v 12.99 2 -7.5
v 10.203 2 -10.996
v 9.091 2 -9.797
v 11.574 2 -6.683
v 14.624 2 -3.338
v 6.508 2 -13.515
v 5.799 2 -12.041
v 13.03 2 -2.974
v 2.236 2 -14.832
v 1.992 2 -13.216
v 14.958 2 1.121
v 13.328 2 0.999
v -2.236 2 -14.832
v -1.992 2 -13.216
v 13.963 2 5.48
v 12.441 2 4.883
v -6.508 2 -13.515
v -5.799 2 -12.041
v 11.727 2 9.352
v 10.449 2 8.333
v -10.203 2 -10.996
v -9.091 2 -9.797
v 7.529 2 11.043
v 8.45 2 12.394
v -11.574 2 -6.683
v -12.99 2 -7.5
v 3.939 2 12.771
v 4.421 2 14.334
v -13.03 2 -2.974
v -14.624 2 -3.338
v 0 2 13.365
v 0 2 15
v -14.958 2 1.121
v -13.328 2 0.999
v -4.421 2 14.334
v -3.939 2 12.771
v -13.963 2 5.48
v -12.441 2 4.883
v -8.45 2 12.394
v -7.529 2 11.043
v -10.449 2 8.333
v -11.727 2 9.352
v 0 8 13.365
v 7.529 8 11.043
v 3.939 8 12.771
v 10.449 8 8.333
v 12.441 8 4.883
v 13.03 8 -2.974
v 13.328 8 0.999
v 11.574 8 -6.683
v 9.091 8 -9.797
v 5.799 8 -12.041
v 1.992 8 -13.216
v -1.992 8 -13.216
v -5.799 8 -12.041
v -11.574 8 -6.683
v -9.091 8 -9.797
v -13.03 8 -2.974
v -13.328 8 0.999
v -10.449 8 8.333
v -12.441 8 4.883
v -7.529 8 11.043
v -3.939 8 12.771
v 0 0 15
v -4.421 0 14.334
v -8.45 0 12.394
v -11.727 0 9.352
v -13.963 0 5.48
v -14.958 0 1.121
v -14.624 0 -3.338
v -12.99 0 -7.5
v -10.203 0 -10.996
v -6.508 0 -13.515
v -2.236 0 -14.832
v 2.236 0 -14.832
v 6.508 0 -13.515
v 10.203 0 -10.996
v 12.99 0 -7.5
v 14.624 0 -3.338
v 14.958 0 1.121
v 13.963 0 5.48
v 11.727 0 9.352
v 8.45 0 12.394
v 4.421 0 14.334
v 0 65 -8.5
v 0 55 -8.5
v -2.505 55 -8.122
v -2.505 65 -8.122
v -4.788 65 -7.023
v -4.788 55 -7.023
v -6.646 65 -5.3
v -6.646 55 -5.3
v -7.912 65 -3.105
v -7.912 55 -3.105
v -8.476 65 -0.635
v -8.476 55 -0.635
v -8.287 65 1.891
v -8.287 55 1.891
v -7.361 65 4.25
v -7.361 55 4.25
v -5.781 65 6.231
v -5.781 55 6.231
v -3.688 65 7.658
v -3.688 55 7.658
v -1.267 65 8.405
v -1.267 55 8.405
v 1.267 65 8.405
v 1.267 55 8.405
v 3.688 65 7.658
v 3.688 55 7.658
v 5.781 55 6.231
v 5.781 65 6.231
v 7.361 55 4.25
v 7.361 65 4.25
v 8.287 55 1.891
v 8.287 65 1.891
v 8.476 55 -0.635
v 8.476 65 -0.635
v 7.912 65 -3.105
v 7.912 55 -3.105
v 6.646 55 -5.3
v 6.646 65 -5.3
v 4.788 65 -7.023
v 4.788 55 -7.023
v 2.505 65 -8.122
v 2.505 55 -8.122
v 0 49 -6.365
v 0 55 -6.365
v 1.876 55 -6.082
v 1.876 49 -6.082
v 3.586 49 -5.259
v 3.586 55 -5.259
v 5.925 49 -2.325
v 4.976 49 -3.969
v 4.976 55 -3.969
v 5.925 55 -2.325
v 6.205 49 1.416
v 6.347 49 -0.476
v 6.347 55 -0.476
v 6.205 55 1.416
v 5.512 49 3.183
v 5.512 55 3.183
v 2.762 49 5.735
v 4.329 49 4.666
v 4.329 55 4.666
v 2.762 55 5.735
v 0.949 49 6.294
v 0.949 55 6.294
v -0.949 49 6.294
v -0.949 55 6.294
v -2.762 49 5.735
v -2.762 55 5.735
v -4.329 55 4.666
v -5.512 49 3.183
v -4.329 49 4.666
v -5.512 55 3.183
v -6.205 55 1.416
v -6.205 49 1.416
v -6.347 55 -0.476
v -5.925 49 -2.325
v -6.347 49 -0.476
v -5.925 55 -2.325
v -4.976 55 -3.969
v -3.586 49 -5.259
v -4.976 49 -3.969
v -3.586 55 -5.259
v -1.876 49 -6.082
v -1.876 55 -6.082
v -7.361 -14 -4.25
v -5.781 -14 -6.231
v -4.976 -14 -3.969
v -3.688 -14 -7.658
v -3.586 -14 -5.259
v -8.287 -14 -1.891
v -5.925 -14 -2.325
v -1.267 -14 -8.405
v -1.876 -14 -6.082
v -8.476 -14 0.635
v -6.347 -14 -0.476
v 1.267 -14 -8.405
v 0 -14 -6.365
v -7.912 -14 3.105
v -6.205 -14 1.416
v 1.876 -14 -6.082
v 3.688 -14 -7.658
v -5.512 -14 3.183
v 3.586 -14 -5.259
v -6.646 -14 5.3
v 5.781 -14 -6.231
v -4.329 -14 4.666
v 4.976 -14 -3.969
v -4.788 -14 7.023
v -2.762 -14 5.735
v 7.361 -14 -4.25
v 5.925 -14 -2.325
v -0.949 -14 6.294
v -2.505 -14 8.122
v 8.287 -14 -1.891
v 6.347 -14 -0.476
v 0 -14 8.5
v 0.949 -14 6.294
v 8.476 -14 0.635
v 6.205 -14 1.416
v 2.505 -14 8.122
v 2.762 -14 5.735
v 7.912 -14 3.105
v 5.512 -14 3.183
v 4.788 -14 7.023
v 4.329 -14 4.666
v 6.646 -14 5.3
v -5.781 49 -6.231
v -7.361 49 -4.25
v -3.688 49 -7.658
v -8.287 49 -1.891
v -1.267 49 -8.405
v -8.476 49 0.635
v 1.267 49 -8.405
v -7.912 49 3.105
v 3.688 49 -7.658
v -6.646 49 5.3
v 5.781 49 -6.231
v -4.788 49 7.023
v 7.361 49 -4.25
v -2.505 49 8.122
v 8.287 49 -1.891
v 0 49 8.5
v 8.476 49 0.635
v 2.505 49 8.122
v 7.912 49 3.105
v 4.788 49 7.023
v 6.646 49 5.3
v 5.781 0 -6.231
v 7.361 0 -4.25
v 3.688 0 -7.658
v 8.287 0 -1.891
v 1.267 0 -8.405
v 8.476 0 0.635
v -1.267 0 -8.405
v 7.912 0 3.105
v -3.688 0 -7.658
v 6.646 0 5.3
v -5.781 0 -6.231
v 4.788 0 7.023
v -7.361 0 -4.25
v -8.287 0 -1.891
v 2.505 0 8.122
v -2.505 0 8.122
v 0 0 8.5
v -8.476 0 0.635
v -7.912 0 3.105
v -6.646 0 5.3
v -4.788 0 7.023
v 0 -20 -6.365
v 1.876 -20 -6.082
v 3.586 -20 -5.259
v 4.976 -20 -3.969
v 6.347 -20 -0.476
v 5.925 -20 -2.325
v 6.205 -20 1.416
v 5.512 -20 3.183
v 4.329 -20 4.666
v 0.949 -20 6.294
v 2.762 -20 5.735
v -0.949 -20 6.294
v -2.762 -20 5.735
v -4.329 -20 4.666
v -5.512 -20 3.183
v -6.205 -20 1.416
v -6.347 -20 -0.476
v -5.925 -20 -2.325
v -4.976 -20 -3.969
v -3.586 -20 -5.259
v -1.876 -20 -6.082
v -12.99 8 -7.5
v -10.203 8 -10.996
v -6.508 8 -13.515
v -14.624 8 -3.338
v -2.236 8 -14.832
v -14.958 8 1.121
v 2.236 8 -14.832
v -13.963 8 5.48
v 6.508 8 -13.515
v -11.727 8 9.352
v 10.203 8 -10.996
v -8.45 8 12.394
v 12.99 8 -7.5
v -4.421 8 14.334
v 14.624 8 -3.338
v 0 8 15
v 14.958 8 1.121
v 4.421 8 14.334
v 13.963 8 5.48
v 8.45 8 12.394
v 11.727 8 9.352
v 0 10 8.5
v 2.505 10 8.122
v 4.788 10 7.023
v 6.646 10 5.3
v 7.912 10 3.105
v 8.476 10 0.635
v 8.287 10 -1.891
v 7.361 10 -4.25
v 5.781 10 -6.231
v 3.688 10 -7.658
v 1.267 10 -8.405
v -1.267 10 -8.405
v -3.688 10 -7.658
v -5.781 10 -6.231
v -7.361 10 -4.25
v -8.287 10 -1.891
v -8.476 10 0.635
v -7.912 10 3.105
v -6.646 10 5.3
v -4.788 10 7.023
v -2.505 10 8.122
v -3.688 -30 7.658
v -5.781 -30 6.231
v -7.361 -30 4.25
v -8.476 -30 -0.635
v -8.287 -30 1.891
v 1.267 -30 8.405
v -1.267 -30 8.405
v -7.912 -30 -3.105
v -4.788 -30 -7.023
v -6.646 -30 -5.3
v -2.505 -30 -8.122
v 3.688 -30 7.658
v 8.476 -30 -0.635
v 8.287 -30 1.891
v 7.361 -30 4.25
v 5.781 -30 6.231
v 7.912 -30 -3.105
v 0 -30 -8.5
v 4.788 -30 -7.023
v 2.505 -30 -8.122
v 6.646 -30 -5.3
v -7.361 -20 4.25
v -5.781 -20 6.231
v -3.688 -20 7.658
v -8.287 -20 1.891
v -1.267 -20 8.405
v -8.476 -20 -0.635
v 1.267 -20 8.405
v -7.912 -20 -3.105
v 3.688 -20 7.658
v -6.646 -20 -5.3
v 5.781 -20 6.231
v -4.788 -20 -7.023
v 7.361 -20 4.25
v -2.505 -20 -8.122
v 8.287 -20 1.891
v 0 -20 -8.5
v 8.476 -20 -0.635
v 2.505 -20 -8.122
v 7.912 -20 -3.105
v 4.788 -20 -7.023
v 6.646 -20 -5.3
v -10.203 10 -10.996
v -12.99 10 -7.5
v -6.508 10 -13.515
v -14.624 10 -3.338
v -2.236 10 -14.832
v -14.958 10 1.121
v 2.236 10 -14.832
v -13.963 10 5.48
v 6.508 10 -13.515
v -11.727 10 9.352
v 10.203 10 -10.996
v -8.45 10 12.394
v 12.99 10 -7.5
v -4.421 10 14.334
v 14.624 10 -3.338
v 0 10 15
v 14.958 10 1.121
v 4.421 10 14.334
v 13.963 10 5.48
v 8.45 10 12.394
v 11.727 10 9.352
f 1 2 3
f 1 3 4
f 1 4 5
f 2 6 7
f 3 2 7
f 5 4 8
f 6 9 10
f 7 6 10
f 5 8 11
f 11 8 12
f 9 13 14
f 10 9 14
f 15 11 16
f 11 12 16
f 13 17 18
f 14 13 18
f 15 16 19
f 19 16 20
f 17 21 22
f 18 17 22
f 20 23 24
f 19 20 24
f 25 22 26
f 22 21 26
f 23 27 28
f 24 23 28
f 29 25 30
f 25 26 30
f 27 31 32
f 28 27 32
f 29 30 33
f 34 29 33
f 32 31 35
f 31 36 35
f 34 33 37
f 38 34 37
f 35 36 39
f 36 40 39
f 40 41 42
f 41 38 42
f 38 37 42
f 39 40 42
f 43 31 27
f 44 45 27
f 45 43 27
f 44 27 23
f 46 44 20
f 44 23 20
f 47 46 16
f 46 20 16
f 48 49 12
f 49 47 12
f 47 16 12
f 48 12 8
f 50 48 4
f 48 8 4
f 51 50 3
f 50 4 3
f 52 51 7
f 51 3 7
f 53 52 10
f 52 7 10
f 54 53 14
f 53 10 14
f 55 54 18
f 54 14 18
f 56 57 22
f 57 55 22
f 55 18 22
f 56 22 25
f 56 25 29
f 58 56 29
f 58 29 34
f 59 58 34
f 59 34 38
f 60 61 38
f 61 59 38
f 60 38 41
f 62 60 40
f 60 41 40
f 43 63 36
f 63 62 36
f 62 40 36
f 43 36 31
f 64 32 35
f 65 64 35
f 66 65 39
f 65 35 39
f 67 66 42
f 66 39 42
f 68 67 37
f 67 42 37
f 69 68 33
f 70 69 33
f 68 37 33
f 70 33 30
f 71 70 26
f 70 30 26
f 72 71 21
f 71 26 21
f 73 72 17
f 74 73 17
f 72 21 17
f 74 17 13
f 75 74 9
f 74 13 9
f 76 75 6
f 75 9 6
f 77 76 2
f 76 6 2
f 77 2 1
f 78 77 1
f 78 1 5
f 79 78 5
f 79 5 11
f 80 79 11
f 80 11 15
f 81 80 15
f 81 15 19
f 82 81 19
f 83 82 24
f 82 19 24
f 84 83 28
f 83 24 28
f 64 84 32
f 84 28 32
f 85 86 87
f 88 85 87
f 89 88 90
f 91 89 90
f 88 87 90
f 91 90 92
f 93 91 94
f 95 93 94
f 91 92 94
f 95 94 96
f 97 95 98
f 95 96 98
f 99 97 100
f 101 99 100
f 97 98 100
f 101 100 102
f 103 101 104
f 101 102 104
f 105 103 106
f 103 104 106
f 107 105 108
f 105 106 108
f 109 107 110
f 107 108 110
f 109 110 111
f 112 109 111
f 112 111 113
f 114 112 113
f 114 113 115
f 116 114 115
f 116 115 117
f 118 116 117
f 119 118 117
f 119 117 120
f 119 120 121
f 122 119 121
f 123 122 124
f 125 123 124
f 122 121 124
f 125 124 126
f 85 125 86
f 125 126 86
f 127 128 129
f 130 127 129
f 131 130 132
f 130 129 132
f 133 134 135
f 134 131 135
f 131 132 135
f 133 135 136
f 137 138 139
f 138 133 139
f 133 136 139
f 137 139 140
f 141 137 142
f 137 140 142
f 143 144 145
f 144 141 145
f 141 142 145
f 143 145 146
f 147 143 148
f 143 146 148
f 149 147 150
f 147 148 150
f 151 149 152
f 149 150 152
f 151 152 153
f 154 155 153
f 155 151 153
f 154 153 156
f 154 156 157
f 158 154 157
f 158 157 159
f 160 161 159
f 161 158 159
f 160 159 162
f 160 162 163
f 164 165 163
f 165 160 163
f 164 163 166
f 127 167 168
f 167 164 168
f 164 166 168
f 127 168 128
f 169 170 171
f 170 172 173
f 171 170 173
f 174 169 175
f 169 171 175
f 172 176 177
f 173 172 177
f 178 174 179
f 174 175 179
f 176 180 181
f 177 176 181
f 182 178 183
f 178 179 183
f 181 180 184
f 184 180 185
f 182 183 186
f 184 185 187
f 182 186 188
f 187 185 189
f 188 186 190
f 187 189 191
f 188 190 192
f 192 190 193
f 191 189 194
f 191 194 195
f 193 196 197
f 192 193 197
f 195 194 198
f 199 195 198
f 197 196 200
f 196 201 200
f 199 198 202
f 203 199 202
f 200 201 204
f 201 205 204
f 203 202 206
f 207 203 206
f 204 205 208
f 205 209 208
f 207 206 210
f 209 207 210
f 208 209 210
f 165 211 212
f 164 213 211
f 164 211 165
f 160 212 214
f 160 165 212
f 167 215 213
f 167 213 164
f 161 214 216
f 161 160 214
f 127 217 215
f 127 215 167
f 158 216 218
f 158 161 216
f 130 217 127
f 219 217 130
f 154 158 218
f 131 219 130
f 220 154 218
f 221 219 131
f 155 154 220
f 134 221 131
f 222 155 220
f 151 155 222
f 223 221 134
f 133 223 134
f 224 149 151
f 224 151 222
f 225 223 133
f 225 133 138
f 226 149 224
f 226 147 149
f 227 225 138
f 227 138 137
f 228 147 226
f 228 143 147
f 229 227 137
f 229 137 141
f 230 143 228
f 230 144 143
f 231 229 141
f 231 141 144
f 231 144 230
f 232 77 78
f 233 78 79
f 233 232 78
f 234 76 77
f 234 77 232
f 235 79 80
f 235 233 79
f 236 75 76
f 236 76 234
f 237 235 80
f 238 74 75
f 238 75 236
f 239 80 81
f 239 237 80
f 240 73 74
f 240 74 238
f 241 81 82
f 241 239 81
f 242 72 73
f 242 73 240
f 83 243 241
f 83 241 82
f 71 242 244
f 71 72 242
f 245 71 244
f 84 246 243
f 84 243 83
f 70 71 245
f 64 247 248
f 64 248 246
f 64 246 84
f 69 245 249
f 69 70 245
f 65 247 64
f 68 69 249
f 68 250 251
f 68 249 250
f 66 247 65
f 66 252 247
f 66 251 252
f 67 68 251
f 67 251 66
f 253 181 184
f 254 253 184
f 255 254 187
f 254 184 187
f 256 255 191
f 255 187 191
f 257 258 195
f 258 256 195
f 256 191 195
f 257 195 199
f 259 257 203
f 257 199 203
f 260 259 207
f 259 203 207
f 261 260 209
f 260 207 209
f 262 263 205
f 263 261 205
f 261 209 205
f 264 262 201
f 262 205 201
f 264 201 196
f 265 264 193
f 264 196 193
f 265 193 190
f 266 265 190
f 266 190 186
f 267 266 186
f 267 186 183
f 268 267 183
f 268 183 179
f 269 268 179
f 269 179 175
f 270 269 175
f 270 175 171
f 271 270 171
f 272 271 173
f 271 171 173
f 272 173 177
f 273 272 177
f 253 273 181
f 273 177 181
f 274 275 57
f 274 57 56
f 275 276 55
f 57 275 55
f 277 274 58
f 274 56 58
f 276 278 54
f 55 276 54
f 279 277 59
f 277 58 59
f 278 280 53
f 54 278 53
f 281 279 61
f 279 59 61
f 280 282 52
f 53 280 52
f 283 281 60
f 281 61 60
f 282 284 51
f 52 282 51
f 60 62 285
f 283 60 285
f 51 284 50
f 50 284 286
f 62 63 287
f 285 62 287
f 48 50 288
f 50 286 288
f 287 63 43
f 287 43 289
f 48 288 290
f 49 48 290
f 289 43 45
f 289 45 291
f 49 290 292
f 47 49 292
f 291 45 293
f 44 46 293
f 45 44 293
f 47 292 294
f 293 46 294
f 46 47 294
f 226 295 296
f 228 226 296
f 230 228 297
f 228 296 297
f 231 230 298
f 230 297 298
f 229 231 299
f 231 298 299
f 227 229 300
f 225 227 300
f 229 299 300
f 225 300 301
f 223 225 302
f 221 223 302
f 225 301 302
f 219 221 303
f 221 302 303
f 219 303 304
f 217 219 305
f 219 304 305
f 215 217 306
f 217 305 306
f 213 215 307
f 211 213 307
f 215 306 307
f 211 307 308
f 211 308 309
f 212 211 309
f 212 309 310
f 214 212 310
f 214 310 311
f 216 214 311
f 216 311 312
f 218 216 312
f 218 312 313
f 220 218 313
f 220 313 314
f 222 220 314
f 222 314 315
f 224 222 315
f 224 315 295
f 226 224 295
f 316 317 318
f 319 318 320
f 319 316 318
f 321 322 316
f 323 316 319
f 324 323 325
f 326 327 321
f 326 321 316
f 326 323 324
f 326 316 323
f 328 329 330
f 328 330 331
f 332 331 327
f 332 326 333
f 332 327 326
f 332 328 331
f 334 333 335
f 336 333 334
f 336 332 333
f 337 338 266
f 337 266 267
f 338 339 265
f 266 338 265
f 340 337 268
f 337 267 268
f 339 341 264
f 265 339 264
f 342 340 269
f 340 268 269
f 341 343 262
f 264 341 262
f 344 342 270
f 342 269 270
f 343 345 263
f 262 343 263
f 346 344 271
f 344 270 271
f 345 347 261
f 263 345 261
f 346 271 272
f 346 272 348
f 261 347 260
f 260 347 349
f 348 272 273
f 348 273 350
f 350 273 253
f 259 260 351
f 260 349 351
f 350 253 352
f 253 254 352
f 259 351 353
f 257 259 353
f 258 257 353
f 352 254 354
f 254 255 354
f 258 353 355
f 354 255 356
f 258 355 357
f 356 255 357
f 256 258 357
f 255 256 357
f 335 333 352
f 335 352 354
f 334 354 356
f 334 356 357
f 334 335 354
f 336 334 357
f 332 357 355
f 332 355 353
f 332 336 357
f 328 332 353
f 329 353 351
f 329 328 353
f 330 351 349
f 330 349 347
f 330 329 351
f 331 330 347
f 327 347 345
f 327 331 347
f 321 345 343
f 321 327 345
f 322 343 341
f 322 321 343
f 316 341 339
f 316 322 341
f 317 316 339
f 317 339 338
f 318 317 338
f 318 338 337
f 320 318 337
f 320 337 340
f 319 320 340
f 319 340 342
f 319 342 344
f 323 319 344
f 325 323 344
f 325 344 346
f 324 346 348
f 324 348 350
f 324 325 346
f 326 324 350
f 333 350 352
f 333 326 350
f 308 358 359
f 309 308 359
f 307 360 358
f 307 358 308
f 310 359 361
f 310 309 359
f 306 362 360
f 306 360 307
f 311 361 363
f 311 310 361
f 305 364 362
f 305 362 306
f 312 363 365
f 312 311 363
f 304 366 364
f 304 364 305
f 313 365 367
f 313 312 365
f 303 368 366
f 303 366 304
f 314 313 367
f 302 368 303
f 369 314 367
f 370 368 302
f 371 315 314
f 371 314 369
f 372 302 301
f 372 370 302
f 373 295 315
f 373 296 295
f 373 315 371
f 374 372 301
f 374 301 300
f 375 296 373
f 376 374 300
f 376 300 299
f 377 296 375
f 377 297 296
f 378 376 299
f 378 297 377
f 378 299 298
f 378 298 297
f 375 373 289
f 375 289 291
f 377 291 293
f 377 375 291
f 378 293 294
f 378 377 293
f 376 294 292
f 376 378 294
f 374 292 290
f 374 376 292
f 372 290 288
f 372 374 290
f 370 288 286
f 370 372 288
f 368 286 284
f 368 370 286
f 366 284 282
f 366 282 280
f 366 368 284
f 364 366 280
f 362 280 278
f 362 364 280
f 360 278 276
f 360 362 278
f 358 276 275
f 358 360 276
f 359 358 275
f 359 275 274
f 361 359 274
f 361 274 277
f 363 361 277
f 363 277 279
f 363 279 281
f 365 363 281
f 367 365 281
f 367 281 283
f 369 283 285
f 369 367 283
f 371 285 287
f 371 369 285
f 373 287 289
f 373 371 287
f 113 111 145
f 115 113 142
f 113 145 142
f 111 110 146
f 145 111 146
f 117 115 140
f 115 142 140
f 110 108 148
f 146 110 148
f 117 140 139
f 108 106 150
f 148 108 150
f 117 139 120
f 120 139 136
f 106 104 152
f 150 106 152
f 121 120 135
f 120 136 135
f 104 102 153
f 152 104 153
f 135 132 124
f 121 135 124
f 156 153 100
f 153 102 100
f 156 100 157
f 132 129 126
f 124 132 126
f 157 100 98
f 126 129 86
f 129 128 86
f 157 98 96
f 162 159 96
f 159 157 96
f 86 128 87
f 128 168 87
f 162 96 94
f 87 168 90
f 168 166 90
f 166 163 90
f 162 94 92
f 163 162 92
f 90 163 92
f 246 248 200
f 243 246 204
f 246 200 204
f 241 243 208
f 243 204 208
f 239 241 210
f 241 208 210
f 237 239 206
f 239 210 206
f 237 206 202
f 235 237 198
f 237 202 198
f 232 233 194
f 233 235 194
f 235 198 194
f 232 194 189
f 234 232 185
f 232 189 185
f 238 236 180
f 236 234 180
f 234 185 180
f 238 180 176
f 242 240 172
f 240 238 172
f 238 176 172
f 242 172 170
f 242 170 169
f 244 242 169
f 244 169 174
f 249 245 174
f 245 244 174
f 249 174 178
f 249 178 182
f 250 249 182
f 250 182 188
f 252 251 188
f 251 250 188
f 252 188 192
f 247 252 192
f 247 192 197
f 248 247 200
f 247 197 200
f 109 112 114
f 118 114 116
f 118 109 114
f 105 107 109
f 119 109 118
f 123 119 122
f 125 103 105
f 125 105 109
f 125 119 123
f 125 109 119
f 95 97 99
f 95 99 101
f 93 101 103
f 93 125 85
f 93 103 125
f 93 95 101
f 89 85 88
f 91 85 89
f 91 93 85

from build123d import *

# Parameters (mm, degrees)
SKETCH1_R                = 13.365
BOSS_EXTRUDE1_DEPTH      = 10
SKETCH2_R                = 15
BOSS_EXTRUDE2_DEPTH      = 2
BOSS_EXTRUDE3_START      = -2
SKETCH3_R                = 15
BOSS_EXTRUDE3_DEPTH      = 2
BOSS_EXTRUDE4_DEPTH      = 30
BOSS_EXTRUDE4_DEPTH_BACK = 65
SKETCH4_R                = 6.365
SKETCH5_R                = 8.5
BOSS_EXTRUDE5_DEPTH      = 10
BOSS_EXTRUDE6_START      = -10
SKETCH6_R                = 8.5
BOSS_EXTRUDE6_DEPTH      = 10
SKETCH7_R                = 8.5
BOSS_EXTRUDE7_DEPTH      = 63


with BuildPart() as part:
    # Sketch1 → Boss-Extrude1 (new body)
    with BuildSketch(Plane(origin=(0, 0, 0), x_dir=(1, 0, 0), z_dir=(0, 1, 0))):
        with Locations(Location((0, 0, 0), (0, 0, 270))):
            Circle(SKETCH1_R)
    extrude(amount=BOSS_EXTRUDE1_DEPTH)

    # Sketch2 → Boss-Extrude2 (add)
    with BuildSketch(Plane(origin=(0, 10, 0), x_dir=(1, 0, 0), z_dir=(0, 1, 0))):
        with Locations(Location((0, 0, 0), (0, 0, 270))):
            Circle(SKETCH2_R)
    extrude(amount=-BOSS_EXTRUDE2_DEPTH)

    # Sketch3 → Boss-Extrude3 (add)
    with BuildSketch(Plane.XZ.offset(BOSS_EXTRUDE3_START)):
        with Locations(Location((0, 0, 0), (0, 0, 90))):
            Circle(SKETCH3_R)
    extrude(amount=BOSS_EXTRUDE3_DEPTH)

    # Sketch4 → Boss-Extrude4 (add, two sides: drawn at the far end of the back side and taken through both)
    with BuildSketch(Plane.XZ.offset(-BOSS_EXTRUDE4_DEPTH_BACK)):
        with Locations(Location((0, 0, 0), (0, 0, 270))):
            Circle(SKETCH4_R)
    extrude(amount=BOSS_EXTRUDE4_DEPTH + BOSS_EXTRUDE4_DEPTH_BACK)

    # Sketch5 → Boss-Extrude5 (add)
    with BuildSketch(Plane.XZ.offset(30)):
        with Locations(Location((0, 0, 0), (0, 0, 270))):
            Circle(SKETCH5_R)
    extrude(amount=-BOSS_EXTRUDE5_DEPTH)

    # Sketch6 → Boss-Extrude6 (add)
    with BuildSketch(Plane(origin=(0, 65, 0), x_dir=(1, 0, 0), z_dir=(0, 1, 0)).offset(BOSS_EXTRUDE6_START)):
        with Locations(Location((0, 0, 0), (0, 0, 90))):
            Circle(SKETCH6_R)
    extrude(amount=BOSS_EXTRUDE6_DEPTH)

    # Sketch7 → Boss-Extrude7 (add)
    with BuildSketch(Plane(origin=(0, -14, 0), x_dir=(1, 0, 0), z_dir=(0, 1, 0))):
        with Locations(Location((0, 0, 0), (0, 0, 270))):
            Circle(SKETCH7_R)
    extrude(amount=BOSS_EXTRUDE7_DEPTH)


solid = part.part
